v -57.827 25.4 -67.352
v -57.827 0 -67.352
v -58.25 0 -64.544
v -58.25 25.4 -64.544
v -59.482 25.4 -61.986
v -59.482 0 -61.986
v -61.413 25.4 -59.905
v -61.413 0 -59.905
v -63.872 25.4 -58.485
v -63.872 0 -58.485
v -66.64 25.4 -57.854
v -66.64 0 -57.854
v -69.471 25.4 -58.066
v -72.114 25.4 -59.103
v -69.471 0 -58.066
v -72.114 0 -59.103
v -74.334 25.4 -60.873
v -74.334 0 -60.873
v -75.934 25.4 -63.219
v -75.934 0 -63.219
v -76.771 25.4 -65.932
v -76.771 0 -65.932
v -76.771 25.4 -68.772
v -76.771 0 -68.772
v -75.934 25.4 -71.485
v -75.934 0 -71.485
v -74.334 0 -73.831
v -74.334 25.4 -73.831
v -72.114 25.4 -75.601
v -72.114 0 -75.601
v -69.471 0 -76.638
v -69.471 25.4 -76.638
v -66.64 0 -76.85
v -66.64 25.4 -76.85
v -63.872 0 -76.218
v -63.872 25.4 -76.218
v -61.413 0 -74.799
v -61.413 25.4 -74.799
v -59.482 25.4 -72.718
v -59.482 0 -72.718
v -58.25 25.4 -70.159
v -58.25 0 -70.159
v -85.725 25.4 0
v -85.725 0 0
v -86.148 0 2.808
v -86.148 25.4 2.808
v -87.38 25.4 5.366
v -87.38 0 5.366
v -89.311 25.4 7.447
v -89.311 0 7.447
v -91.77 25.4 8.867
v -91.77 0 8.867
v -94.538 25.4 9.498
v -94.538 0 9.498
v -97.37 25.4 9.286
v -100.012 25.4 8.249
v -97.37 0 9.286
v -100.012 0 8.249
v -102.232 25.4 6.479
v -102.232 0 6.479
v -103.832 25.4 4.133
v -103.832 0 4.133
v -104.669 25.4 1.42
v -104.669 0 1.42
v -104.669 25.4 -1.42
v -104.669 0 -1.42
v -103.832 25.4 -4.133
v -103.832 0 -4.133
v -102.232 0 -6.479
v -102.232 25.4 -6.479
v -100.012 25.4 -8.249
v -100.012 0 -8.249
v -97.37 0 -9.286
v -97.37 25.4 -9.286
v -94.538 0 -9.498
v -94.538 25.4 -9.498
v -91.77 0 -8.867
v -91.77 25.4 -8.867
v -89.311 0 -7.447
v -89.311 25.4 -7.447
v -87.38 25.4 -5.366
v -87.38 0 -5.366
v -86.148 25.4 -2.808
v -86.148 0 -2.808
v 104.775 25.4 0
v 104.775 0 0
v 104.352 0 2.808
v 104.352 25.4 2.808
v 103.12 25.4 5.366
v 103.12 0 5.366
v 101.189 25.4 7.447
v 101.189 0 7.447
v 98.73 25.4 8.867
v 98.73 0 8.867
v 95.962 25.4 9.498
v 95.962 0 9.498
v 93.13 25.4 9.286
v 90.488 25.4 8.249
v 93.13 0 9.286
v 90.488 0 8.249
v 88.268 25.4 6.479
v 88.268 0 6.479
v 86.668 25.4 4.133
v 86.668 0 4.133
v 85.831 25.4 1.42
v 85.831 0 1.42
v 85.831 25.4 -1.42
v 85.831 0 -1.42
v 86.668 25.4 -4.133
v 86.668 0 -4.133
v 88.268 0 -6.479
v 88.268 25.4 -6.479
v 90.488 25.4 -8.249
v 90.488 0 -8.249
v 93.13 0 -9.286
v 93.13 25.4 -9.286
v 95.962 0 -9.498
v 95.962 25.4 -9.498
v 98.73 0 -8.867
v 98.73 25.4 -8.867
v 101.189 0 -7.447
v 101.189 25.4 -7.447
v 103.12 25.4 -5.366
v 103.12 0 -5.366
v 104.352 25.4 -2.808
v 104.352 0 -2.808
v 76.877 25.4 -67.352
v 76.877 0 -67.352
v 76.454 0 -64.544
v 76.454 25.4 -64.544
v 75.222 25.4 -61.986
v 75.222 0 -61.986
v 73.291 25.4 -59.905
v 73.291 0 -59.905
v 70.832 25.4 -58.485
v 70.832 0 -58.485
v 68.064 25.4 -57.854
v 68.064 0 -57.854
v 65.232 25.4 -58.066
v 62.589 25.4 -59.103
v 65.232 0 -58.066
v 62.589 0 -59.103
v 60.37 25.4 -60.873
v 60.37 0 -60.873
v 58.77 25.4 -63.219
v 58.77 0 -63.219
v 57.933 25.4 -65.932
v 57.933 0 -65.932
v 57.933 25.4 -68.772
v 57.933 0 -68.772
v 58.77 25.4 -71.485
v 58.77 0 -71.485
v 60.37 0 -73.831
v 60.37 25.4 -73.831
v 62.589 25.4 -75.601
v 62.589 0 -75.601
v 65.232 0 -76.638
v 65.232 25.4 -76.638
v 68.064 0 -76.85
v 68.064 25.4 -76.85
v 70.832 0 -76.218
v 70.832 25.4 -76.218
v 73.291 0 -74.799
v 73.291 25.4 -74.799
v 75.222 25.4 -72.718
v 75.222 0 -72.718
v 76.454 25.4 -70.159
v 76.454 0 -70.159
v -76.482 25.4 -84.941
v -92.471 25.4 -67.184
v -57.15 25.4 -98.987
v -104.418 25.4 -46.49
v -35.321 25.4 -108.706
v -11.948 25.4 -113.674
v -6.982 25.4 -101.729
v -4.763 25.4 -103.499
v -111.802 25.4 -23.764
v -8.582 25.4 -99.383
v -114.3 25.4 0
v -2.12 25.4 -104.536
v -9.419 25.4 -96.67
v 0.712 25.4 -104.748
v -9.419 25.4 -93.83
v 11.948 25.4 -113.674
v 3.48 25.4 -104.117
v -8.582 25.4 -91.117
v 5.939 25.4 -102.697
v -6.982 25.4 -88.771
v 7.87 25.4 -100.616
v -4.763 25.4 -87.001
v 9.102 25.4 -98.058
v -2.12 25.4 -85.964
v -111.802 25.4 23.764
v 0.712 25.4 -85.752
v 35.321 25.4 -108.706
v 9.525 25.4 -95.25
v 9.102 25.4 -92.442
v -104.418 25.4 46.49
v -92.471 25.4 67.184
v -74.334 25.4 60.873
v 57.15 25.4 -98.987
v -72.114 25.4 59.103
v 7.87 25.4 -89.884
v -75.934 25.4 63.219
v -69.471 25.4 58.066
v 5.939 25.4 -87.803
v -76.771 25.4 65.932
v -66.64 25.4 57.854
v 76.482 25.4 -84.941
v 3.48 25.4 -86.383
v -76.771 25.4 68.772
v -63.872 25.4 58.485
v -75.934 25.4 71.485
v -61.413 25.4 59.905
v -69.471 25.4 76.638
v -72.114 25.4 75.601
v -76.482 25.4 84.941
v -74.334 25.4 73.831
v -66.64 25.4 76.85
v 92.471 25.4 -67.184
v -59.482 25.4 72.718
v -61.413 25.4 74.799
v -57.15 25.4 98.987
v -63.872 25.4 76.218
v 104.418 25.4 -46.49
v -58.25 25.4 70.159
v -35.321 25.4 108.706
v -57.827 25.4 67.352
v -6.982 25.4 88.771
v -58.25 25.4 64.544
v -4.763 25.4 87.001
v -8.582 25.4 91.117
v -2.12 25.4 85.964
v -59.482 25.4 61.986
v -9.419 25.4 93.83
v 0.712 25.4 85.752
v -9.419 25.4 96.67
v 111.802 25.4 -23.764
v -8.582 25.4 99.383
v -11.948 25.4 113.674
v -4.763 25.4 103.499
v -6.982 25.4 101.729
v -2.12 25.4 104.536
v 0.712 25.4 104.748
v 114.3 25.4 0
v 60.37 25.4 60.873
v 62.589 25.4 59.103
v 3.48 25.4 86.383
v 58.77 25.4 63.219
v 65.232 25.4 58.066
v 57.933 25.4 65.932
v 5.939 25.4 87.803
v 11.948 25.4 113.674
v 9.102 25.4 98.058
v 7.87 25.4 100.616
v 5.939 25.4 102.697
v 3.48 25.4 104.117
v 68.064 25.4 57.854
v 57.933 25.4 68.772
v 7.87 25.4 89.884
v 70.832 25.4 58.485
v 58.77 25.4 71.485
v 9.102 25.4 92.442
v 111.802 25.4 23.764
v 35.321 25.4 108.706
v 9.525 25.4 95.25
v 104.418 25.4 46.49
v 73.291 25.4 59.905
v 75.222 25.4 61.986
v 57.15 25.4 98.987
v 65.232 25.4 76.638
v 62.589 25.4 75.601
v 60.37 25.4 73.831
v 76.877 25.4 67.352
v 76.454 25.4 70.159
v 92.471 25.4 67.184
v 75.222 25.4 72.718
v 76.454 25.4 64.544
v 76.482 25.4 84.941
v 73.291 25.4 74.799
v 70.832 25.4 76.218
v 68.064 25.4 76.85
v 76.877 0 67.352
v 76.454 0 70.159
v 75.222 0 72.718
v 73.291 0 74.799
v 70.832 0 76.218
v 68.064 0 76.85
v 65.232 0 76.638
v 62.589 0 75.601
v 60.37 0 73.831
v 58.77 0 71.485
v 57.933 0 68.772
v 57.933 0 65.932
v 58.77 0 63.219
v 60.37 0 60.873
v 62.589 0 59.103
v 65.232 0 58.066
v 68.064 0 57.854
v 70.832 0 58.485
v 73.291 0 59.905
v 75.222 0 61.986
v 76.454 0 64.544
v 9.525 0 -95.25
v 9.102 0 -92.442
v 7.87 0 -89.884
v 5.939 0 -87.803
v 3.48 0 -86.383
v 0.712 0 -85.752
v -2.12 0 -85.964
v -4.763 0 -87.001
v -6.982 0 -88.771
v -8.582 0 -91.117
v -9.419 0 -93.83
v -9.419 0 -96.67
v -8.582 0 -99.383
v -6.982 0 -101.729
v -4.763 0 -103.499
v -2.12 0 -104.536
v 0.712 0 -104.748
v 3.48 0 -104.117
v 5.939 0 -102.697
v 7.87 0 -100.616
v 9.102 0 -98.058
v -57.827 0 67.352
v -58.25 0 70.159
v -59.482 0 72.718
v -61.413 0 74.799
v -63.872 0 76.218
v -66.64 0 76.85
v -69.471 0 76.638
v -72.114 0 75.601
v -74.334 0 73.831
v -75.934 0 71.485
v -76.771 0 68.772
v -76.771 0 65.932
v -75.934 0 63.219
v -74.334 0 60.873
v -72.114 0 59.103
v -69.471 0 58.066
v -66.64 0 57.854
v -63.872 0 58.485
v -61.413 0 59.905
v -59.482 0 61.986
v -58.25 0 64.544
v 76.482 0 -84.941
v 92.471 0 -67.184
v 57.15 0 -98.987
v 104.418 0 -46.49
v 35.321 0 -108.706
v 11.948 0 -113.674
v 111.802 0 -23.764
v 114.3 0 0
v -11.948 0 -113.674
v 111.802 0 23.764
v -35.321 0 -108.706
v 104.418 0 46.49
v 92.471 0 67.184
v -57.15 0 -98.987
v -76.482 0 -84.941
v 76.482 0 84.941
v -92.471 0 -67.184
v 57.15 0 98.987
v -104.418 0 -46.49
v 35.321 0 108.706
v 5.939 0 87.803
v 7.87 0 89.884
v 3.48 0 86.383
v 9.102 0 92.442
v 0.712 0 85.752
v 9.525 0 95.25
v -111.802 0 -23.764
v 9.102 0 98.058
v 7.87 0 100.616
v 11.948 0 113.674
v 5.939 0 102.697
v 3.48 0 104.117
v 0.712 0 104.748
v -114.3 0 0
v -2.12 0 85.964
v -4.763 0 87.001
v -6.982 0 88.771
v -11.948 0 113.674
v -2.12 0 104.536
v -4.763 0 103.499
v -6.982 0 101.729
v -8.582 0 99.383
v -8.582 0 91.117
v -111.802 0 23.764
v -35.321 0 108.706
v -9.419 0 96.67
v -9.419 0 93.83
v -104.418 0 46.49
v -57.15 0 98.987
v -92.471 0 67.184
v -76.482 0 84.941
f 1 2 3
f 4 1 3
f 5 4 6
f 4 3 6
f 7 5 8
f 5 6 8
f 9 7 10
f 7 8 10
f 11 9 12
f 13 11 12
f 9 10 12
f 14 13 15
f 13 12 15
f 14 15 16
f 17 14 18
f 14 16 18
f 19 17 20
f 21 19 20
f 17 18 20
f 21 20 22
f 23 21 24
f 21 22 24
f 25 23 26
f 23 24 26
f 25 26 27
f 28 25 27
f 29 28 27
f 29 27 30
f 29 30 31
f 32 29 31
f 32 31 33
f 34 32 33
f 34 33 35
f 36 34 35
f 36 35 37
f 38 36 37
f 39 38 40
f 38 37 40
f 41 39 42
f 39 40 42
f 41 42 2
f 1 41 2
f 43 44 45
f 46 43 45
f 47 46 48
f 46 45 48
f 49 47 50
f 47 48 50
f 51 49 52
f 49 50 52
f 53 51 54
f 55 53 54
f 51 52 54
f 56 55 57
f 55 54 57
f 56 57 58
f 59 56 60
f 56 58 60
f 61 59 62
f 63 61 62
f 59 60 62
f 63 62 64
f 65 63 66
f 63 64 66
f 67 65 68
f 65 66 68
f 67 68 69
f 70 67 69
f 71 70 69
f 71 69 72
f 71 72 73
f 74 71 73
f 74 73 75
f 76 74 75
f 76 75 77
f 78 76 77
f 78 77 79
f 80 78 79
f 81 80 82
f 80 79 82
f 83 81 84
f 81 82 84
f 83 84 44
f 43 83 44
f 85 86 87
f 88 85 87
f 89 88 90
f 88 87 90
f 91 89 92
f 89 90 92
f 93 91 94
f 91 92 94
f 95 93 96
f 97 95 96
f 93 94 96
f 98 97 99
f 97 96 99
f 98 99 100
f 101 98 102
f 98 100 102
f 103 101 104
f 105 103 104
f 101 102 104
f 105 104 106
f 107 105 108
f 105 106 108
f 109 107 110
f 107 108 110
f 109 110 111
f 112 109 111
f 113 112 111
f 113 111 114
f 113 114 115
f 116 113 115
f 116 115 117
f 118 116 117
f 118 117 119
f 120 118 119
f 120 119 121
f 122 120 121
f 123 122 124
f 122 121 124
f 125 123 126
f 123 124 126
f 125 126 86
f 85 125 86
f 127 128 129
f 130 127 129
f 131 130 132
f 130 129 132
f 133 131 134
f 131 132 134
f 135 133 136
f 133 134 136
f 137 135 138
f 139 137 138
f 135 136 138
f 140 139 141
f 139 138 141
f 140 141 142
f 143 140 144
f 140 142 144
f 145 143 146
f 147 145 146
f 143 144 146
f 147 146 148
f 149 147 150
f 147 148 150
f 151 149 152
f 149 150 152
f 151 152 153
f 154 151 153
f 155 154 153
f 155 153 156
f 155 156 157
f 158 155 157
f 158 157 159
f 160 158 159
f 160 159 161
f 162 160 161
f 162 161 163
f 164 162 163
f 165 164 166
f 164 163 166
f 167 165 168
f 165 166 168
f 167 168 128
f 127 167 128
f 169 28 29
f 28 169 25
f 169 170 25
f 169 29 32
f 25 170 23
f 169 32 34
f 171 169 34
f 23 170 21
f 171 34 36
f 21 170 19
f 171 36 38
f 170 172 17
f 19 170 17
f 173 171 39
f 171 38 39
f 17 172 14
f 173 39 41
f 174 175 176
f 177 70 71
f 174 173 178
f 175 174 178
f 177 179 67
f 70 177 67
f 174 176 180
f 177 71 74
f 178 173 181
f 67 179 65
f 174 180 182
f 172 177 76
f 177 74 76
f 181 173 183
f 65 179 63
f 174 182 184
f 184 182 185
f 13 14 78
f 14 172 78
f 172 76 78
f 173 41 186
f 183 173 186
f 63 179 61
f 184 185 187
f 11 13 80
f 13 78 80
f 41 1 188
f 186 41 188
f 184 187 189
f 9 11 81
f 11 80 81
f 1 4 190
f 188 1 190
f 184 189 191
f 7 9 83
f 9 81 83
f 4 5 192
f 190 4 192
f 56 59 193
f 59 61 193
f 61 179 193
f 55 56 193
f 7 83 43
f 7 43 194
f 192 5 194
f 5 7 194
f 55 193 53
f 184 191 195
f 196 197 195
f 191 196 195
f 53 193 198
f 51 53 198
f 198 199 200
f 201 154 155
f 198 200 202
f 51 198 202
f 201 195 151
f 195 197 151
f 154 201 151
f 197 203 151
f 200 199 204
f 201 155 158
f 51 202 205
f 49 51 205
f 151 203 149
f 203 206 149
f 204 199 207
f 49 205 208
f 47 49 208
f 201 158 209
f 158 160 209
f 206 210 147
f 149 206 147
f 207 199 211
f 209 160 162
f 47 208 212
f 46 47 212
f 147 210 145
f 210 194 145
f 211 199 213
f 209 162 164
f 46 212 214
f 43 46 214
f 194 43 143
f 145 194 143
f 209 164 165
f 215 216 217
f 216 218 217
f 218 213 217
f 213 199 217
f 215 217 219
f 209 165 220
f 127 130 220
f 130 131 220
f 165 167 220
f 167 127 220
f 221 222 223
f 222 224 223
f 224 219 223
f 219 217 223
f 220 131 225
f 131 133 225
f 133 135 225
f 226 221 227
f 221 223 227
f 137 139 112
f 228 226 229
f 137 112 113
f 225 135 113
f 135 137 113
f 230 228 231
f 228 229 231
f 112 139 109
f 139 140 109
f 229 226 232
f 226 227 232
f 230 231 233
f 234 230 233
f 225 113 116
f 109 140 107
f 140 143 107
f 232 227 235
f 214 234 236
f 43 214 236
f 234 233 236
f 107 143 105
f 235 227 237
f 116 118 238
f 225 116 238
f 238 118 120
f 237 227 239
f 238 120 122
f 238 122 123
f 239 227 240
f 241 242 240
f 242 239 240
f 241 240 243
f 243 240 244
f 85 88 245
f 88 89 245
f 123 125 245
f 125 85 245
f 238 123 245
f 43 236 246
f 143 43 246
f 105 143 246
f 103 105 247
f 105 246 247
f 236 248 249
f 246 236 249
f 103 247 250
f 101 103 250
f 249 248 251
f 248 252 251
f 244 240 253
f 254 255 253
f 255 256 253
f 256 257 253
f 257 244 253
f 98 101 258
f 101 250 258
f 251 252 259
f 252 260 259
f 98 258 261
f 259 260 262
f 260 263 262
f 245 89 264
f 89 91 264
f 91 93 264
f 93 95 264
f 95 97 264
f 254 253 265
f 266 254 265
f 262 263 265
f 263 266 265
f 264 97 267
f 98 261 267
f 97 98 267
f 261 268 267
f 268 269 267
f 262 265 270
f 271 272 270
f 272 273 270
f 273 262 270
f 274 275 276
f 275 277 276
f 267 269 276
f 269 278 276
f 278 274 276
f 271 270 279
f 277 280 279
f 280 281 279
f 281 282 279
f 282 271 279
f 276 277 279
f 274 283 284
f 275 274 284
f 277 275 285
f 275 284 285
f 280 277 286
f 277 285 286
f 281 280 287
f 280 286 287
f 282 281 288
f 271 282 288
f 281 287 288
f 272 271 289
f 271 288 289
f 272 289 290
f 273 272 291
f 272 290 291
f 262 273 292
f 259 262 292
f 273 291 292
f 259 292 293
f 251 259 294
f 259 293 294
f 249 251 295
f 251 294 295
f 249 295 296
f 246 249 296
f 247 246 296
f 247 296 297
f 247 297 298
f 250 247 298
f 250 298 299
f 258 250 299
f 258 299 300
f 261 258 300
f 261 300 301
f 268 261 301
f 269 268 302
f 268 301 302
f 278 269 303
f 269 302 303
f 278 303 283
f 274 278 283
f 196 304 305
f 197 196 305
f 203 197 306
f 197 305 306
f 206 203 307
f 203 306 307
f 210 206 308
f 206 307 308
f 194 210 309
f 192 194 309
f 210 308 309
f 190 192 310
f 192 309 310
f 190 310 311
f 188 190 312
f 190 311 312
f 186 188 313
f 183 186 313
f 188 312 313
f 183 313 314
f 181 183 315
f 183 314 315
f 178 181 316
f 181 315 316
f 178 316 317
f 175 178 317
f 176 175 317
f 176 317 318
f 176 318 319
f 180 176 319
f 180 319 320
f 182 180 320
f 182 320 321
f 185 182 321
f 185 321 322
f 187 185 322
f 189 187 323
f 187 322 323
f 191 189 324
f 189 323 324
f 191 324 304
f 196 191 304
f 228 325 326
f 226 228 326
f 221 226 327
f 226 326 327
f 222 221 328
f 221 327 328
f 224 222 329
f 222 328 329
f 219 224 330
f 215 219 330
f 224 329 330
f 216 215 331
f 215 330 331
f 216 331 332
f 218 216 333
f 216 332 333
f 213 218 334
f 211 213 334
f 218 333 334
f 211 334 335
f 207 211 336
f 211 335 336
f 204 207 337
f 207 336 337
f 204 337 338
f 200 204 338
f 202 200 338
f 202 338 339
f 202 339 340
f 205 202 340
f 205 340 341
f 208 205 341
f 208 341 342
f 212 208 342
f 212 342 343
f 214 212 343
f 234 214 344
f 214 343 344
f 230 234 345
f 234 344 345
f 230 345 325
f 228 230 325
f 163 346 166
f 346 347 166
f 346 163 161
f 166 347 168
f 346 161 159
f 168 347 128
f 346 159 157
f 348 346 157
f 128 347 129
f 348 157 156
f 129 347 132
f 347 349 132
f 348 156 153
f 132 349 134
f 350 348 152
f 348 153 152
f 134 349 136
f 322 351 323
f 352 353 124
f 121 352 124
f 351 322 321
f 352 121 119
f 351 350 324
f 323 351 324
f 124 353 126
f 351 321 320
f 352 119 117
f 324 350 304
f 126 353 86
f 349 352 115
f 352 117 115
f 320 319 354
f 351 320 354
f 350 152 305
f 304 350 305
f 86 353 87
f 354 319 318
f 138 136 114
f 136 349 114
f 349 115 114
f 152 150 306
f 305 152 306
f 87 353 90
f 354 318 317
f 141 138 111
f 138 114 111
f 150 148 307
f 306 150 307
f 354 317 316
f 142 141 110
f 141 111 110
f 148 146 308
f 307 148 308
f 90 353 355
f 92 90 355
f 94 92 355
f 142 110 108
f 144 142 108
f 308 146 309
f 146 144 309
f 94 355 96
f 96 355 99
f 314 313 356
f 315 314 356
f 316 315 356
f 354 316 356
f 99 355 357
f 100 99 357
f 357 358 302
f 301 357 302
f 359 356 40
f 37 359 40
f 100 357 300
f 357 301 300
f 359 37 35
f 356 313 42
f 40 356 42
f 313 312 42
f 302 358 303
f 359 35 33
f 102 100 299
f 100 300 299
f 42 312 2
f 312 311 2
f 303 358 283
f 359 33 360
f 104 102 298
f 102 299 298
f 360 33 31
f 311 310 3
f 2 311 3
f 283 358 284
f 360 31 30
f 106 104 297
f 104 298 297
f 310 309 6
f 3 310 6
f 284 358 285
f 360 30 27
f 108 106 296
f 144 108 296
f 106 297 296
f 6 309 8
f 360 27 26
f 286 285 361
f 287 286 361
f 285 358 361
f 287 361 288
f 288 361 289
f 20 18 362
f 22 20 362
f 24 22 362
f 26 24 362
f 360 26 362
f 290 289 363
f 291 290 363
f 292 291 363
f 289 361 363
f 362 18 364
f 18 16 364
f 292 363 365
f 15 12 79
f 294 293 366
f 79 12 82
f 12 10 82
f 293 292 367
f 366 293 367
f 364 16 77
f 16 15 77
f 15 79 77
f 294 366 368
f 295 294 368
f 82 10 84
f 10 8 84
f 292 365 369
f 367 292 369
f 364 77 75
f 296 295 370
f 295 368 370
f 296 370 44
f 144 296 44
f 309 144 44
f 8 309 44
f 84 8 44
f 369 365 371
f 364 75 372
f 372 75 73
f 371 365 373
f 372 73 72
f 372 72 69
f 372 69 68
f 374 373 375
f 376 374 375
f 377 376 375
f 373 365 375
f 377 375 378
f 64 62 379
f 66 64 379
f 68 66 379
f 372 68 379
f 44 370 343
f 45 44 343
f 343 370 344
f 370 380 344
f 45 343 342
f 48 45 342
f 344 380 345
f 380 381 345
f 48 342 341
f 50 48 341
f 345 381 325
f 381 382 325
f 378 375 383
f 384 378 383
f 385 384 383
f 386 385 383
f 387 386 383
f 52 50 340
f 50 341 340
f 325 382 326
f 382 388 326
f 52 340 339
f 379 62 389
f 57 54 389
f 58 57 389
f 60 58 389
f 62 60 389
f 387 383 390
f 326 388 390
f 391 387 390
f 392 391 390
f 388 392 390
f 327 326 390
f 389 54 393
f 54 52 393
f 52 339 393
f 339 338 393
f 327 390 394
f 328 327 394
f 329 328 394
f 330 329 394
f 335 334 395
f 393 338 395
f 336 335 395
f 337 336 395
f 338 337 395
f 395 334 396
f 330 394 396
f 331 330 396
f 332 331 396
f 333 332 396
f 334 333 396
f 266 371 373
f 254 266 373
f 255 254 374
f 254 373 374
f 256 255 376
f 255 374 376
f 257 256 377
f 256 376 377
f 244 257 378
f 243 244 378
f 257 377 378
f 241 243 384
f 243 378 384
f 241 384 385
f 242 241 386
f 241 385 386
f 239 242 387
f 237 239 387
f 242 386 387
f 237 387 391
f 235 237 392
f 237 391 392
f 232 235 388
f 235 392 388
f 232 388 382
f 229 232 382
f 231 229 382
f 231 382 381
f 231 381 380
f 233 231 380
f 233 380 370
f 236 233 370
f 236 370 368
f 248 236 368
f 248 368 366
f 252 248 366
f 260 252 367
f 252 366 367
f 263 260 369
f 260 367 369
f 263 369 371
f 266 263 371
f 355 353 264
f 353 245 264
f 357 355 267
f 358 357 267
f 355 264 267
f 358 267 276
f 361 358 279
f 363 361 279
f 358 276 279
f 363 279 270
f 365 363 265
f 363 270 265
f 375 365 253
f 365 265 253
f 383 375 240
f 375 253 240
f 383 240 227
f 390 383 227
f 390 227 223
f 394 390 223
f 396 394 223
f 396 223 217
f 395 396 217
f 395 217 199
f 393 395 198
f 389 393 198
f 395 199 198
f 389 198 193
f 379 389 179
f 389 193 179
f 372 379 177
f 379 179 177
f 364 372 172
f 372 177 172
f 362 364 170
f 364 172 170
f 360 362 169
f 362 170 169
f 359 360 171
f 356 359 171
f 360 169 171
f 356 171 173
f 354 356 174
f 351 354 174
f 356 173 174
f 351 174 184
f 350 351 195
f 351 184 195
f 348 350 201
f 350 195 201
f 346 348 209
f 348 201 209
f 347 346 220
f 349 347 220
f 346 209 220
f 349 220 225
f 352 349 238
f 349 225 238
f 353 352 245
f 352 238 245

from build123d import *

# Parameters (mm, degrees)
F0_W     = 63.1698
F0_H     = 25.4
F0_W_2   = 51.1302
F2_R     = 9.525
F3_DEPTH = 25.4


with BuildPart() as f1:
    # F0 (on Top) → F1 (revolve)
    with BuildSketch(Plane.XY):
        with Locations((82.7151, 12.7)):
            Rectangle(F0_W, F0_H)
        with Locations((25.5651, 12.7)):
            Rectangle(F0_W_2, F0_H)
    revolve(axis=Axis((0, 12.7, 0), (0, -1, 0)))

    # F2 (on face) → F3 (cut, through all)
    with BuildSketch(Plane.XZ):
        with Locations((-95.25, 0)):
            Circle(F2_R)
        with Locations((-67.351921, -67.351921)):
            Circle(F2_R)
        with Locations((0, -95.25)):
            Circle(F2_R)
        with Locations((67.351921, -67.351921)):
            Circle(F2_R)
        with Locations((95.25, 0)):
            Circle(F2_R)
        with Locations((67.351921, 67.351921)):
            Circle(F2_R)
        with Locations((0, 95.25)):
            Circle(F2_R)
        with Locations((-67.351921, 67.351921)):
            Circle(F2_R)
    extrude(amount=-F3_DEPTH, mode=Mode.SUBTRACT)


solid = f1.part
